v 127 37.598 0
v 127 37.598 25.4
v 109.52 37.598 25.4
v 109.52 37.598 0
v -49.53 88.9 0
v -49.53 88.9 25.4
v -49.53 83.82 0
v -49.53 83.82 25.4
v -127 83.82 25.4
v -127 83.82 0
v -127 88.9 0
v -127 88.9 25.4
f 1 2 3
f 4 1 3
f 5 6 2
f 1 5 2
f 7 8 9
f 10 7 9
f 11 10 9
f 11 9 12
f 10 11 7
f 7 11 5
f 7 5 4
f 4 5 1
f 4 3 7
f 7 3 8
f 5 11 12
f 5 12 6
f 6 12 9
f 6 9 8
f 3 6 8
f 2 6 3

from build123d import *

# Parameters (mm, degrees)
SKETCH1_W           = 254
SKETCH1_H           = 177.8
BOSS_EXTRUDE1_DEPTH = 25.4
CUT_EXTRUDE1_DEPTH  = 158.090324336


with BuildPart() as part:
    # Sketch1 → Boss-Extrude1 (new body)
    with BuildSketch(Plane.XY):
        Rectangle(SKETCH1_W, SKETCH1_H)
    extrude(amount=BOSS_EXTRUDE1_DEPTH)

    # Sketch3 → Cut-Extrude1 (cut, through all)
    with BuildSketch(Plane.XY.offset(25.4)):
        Polygon((127, 88.9), (-49.53, 88.9), (127, 37.598007728), align=None)
        Polygon((-49.53, 83.82), (-127, 83.82), (-127, -88.9), (127, -88.9), (127, 37.598007728), (109.519735389, 37.598007728), align=None)
    extrude(amount=-CUT_EXTRUDE1_DEPTH, mode=Mode.SUBTRACT)


solid = part.part
